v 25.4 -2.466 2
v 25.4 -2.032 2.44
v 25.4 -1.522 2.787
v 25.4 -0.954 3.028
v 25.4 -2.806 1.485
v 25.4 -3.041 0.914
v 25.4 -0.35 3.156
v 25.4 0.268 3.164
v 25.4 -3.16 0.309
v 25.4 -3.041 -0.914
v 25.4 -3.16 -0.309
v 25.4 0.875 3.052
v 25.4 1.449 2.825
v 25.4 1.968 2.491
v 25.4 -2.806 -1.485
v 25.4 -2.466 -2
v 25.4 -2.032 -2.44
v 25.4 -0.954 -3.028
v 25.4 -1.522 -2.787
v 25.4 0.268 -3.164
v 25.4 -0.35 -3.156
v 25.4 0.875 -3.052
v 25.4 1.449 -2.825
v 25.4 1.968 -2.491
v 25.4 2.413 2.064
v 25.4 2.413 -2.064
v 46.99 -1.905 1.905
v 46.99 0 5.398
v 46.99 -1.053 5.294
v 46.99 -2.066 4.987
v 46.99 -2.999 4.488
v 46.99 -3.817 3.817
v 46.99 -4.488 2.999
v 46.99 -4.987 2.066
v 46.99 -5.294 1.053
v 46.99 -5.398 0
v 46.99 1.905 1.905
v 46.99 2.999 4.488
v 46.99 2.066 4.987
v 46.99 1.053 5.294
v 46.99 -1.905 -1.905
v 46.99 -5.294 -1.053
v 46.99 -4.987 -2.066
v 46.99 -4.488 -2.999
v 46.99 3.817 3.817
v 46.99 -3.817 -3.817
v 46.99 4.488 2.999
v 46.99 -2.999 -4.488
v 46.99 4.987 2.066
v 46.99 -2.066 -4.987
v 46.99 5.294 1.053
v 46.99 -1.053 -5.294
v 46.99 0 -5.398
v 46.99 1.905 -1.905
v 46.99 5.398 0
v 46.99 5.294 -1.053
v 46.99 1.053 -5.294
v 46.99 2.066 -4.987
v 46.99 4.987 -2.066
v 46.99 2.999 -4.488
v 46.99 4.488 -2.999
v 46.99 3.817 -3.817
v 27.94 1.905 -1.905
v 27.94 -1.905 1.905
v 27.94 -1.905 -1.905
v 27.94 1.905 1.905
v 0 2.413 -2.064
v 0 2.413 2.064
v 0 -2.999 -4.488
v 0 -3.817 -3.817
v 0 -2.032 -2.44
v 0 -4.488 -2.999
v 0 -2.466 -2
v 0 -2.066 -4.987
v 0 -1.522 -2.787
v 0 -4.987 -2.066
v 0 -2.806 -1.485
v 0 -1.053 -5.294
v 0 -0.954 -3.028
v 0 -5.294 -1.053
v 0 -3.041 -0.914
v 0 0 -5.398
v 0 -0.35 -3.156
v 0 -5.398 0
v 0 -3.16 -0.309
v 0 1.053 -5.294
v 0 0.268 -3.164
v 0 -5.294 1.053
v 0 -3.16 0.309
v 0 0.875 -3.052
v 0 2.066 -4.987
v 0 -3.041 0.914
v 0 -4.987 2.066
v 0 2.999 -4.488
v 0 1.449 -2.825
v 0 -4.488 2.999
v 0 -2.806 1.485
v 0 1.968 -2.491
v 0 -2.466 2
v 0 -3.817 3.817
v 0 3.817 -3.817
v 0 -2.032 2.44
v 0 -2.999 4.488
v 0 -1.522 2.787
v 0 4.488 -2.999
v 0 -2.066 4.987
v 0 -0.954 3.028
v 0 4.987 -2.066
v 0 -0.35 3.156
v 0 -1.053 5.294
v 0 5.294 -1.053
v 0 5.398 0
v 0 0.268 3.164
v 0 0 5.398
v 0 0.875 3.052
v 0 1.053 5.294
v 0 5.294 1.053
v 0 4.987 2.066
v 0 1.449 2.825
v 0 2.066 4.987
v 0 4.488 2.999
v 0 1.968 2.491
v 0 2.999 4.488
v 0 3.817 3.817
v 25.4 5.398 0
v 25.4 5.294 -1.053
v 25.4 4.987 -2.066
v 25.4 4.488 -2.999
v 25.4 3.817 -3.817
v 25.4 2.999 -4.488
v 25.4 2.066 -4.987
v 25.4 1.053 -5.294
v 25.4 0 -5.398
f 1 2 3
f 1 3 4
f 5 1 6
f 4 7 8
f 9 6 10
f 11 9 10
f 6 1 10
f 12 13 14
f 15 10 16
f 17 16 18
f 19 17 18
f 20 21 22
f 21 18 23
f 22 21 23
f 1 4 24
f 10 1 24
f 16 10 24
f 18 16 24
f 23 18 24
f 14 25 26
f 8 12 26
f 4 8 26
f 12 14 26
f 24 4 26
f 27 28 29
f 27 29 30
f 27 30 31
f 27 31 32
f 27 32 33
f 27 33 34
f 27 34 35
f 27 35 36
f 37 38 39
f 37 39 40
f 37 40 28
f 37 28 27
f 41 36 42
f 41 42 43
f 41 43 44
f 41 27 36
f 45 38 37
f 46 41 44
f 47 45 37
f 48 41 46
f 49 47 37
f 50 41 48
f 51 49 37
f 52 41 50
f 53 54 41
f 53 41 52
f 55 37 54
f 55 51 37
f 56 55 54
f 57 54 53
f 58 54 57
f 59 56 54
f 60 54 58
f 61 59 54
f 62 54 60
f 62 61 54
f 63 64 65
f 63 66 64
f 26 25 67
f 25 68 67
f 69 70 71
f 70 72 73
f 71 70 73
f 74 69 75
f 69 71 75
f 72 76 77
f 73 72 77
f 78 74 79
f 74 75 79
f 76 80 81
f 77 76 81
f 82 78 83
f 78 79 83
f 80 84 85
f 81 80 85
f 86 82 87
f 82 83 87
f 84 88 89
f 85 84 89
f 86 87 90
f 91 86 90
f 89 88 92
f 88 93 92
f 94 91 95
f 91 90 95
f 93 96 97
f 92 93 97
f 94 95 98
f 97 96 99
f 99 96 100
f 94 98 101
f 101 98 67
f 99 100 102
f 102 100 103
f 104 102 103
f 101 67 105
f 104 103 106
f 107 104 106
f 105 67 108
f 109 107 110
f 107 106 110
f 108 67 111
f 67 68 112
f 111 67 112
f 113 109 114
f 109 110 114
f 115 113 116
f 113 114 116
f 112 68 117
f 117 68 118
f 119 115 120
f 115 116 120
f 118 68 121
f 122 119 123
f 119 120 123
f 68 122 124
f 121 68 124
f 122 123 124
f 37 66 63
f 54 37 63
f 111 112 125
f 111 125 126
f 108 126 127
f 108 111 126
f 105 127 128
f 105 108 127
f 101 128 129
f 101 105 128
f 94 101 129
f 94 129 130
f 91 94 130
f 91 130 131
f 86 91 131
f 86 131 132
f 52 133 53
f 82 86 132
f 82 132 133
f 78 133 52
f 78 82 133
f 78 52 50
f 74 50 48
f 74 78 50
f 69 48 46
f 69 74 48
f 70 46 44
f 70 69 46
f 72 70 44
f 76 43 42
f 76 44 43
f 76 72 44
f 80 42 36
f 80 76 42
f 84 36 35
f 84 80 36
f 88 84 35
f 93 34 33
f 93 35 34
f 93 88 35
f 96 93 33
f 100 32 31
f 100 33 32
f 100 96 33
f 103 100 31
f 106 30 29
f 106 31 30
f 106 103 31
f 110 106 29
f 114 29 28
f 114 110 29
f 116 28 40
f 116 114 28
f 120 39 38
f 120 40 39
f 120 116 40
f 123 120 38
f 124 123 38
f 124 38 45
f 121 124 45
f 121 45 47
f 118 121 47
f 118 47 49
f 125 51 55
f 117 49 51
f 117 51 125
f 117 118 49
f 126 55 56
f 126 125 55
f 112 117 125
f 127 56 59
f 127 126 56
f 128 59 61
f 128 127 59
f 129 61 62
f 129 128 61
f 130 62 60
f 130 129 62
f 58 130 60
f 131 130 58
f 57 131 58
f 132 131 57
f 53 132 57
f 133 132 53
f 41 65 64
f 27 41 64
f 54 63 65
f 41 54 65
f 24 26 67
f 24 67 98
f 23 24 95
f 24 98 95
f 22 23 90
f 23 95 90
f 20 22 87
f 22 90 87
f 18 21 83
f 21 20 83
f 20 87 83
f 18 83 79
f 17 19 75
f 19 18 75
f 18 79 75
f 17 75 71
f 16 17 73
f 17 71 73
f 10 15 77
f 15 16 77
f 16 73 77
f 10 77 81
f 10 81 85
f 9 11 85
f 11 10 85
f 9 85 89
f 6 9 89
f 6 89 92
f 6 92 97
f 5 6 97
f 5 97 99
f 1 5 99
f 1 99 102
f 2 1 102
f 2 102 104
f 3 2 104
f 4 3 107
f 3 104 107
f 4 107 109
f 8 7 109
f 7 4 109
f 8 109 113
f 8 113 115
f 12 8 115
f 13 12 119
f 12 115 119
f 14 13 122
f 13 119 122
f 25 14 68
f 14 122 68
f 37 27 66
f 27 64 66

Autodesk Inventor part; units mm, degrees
ref_plane "YZ Plane" through (0, 0, 0) normal (1, 0, 0) x (0, 1, 0)
ref_plane "XZ Plane" through (0, 0, 0) normal (0, 1, 0) x (-1, 0, 0)
ref_plane "XY Plane" through (0, 0, 0) normal (0, 0, 1) x (1, 0, 0)
sketch "Sketch1" plane through (0, 0, 0) normal (1, 0, 0) x (0, 1, 0)
  circle A0 centre (0, 0) radius 5.3975
  circle A1 centre (0, 0) radius 3.175
  line L0 (-3.175, 0) -> (2.413, 0) construction
  line L1 (2.413, 0) -> (2.413, -2.0635)
  line L2 (2.413, 0) -> (2.413, 2.0635)
  dimension "d0" = 10.795
  dimension "d1" = 6.35
  dimension "d2" = 5.588
extrude "Extrusion1" add sketch "Sketch1" along normal blind 25.4 contours A0 | A1 L1 L2 picked at (2.5514, -1.1687)
sketch "Sketch2" plane through (25.4, 0, 0) normal (1, 0, 0) x (0, 0, -1)
  circle A0 centre (0, 0) radius 5.3975
  dimension "d11" = 10.795
extrude "Extrusion2" add sketch "Sketch2" along normal blind 2.54
sketch "Sketch3" plane through (27.94, 0, 0) normal (1, 0, 0) x (0, 0, -1)
  arc A0 (-2.0635, 2.413) -> (2.0635, 2.413) centre (0, 0) ccw projected
  circle A1 centre (0, 0) radius 5.3975
  line L0 (1.905, -1.905) -> (-1.905, -1.905)
  line L1 (-1.905, -1.905) -> (-1.905, 1.905)
  line L2 (-1.905, 1.905) -> (1.905, 1.905)
  line L3 (1.905, 1.905) -> (1.905, -1.905)
  line L4 (1.905, -1.905) -> (-1.905, 1.905) construction
  line L5 (-1.905, -1.905) -> (1.905, 1.905) construction
  dimension "d7" = 3.81
  dimension "d8" = 3.81
  dimension "d12" = 10.795
extrude "Extrusion3" add sketch "Sketch3" along normal blind 19.05
properties part number "NeveRestVex"
